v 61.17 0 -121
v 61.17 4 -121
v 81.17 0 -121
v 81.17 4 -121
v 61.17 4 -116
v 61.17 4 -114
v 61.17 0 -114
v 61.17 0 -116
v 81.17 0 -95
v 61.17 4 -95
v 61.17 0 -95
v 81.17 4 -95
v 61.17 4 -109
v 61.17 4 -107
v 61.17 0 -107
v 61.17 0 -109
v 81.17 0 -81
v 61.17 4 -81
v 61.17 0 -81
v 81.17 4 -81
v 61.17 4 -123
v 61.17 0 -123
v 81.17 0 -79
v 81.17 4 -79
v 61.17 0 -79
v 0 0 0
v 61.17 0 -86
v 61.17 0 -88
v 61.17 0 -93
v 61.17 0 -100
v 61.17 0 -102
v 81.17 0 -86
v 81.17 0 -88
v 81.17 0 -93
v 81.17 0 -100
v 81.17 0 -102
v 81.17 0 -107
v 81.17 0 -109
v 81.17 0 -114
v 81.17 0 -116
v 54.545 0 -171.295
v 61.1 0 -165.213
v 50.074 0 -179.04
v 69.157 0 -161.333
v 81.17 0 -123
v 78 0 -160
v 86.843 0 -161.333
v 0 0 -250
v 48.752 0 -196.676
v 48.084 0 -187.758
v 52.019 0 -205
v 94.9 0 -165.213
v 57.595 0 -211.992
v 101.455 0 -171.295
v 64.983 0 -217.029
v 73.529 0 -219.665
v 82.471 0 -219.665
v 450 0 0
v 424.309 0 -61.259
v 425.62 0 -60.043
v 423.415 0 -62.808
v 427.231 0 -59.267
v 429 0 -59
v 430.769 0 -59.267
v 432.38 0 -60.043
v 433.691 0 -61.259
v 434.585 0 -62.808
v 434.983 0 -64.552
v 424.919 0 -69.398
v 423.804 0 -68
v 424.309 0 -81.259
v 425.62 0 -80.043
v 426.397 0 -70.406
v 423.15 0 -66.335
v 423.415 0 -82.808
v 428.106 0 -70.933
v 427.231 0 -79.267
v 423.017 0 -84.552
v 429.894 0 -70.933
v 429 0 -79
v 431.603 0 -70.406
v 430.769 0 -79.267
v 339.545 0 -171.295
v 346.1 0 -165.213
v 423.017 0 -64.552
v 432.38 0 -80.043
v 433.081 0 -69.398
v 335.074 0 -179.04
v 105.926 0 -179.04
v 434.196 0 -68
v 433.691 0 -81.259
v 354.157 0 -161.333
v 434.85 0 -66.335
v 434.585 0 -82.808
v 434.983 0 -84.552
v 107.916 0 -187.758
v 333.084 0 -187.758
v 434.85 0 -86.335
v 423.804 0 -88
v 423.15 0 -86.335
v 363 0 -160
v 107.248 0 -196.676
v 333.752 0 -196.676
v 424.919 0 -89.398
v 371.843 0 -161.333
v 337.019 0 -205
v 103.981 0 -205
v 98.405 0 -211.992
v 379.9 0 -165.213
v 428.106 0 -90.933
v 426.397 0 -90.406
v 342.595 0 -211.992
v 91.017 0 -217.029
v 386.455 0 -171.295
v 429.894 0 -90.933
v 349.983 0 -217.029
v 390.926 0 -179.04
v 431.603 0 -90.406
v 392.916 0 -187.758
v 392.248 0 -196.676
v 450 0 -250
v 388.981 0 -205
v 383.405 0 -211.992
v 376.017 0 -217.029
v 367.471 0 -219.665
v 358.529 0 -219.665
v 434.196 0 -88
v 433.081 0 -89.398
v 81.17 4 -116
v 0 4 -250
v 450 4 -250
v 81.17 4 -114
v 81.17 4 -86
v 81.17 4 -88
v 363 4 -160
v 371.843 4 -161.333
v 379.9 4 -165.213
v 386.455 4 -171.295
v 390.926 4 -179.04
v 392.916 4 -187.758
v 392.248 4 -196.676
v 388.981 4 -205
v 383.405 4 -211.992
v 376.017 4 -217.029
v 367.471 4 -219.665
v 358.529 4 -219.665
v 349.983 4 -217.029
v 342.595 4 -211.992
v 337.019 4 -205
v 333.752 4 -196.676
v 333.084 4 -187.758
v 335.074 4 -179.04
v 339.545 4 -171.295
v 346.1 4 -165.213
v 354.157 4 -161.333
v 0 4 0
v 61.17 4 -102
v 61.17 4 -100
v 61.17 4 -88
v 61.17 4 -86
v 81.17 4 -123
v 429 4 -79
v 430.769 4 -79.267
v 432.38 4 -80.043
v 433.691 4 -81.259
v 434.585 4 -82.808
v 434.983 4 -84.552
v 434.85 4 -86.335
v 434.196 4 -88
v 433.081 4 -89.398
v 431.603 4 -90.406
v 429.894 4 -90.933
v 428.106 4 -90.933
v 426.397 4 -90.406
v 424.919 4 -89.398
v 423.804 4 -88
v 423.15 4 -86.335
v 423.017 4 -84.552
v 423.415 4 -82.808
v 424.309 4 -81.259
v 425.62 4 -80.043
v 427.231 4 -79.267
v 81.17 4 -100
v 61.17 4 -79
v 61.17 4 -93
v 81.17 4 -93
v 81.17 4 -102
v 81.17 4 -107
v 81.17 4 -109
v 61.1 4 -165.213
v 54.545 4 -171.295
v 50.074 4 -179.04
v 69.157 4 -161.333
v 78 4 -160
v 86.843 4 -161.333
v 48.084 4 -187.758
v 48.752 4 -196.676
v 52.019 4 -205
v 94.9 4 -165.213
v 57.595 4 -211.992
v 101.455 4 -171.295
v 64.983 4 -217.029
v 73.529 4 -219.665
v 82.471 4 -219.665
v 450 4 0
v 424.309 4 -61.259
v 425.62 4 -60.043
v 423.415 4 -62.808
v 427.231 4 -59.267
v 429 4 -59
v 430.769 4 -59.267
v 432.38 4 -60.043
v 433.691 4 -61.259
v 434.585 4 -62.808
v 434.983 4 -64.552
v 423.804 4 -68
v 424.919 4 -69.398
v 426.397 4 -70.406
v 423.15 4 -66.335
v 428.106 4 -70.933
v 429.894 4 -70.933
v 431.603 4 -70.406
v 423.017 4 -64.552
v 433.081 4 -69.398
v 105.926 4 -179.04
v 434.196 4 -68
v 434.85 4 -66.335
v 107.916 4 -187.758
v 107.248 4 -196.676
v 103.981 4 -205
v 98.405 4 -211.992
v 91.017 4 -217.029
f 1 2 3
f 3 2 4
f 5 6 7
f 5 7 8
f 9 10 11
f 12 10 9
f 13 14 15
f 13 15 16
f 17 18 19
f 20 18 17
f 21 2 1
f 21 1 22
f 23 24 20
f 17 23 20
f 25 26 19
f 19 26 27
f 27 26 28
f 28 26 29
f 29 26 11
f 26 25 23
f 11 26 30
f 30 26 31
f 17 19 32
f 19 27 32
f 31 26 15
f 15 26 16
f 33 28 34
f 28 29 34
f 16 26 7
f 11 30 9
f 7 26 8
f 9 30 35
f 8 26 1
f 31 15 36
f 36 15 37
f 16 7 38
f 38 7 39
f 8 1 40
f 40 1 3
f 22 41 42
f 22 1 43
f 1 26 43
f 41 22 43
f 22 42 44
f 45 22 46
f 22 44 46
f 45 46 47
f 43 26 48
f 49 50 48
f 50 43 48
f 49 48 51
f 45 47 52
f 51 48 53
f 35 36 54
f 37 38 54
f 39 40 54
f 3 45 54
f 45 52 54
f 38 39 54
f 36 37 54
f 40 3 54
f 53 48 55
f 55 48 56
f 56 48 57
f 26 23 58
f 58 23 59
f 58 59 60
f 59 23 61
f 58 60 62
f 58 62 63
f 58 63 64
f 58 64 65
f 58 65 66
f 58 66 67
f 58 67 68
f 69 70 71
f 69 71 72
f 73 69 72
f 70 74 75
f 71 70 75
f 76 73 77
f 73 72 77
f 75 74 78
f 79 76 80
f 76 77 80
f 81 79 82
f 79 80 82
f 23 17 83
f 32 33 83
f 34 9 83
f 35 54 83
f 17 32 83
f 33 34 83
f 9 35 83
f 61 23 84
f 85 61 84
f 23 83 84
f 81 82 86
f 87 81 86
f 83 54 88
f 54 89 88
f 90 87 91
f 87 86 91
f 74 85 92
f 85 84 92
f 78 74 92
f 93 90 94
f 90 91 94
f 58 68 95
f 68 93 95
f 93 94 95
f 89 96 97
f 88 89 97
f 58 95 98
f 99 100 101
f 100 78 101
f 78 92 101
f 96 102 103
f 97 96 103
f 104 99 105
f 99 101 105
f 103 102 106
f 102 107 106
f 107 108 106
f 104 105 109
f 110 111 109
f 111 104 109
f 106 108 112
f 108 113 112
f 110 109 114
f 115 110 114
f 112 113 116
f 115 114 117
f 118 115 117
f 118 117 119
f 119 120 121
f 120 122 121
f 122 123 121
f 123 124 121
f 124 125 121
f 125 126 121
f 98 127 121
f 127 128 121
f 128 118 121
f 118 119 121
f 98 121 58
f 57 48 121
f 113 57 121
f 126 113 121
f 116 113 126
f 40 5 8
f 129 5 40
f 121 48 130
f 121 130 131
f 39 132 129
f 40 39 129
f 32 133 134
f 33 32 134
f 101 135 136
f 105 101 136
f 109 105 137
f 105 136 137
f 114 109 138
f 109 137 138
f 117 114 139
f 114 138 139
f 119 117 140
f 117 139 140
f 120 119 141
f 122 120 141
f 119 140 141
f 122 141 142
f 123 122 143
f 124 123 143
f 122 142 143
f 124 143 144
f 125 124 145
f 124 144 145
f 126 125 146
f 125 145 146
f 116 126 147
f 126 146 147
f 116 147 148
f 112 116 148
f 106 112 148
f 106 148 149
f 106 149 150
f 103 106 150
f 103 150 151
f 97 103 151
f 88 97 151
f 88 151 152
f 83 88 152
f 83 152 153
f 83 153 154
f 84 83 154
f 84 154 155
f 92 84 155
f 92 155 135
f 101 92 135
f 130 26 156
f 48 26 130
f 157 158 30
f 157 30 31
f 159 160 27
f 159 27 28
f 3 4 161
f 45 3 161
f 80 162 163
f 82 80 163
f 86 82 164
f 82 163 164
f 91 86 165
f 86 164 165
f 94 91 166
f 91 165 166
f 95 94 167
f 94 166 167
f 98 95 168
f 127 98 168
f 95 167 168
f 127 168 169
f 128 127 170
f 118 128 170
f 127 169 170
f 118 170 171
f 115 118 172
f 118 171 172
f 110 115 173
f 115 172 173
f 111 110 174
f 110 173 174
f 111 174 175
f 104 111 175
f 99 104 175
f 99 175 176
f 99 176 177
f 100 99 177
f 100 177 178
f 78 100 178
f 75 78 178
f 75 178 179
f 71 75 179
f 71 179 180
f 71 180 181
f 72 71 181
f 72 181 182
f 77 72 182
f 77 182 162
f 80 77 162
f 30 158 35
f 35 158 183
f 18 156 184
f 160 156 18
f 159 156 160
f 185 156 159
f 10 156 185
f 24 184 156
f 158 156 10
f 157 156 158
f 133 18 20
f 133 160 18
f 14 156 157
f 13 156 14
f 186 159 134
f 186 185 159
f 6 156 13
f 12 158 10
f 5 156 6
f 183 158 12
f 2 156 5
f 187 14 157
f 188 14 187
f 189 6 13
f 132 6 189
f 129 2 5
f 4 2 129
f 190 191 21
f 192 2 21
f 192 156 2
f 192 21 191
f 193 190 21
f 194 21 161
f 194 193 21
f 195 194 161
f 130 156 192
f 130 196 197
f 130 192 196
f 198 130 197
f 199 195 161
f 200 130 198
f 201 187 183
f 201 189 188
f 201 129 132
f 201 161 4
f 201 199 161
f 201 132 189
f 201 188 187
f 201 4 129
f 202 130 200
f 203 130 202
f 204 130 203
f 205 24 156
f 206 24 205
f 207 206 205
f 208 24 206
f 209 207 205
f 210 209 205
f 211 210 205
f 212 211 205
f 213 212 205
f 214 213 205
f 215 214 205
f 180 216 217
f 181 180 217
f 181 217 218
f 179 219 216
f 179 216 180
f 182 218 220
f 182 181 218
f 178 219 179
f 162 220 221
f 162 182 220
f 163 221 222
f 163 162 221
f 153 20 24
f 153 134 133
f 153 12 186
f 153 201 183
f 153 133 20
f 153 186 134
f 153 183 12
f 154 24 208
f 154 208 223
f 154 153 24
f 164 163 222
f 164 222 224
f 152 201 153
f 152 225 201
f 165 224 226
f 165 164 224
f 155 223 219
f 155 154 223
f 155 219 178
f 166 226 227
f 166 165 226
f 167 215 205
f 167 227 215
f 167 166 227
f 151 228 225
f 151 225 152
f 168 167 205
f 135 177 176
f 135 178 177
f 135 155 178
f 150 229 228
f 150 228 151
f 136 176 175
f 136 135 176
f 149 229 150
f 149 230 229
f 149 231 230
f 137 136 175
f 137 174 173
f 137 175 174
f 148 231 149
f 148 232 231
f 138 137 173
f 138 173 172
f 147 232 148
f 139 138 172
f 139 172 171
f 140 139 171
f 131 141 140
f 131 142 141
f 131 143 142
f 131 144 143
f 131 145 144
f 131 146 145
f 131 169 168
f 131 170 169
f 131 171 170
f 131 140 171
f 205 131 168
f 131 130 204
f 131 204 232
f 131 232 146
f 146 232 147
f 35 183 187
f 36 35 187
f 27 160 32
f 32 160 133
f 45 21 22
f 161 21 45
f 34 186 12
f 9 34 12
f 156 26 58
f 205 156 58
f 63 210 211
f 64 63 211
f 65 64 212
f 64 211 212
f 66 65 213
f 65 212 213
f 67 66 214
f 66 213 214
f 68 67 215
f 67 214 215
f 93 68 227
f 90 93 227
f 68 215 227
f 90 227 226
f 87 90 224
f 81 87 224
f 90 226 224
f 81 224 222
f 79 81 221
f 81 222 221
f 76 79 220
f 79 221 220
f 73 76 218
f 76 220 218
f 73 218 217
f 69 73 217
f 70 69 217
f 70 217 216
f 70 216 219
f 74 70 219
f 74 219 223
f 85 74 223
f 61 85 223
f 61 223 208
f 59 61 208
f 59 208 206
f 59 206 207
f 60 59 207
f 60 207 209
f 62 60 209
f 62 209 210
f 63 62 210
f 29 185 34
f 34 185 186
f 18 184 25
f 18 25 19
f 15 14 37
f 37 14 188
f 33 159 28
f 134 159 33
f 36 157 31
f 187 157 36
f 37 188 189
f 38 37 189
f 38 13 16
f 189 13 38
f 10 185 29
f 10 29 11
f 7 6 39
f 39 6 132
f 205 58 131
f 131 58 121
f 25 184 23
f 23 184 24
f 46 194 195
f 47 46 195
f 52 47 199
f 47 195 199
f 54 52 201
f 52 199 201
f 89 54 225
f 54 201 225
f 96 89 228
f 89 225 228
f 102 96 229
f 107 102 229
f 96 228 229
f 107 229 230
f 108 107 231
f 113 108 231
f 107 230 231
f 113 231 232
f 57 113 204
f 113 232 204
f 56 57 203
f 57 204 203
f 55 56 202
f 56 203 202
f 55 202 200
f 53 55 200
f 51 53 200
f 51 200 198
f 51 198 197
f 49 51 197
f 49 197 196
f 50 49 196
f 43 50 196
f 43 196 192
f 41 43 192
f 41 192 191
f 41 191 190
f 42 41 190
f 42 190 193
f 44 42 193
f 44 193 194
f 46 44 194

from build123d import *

# Parameters (mm, degrees)
SKETCH_1_W          = 450
SKETCH_1_H          = 250
EXTRUDE_1_DEPTH     = 4
SKETCH_2_R          = 30
CUT_EXTRUDE_1_DEPTH = 515.797047389
SKETCH_3_R          = 6
SKETCH_3_W          = 20
SKETCH_3_H          = 2
CUT_EXTRUDE_2_DEPTH = 515.797047389


with BuildPart() as part:
    # 草圖1 → 填料-伸長1 (new body)
    with BuildSketch(Plane(origin=(0, 0, 0), x_dir=(1, 0, 0), z_dir=(0, 1, 0))):
        with Locations((225, 125)):
            Rectangle(SKETCH_1_W, SKETCH_1_H)
    extrude(amount=EXTRUDE_1_DEPTH)

    # 草圖2 → 除料-伸長1 (cut, through all)
    with BuildSketch(Plane(origin=(0, 4, 0), x_dir=(1, 0, 0), z_dir=(0, 1, 0))):
        with Locations(Location((78, 190, 0), (0, 0, 270))):
            Circle(SKETCH_2_R)
        with Locations(Location((363, 190, 0), (0, 0, 270))):
            Circle(SKETCH_2_R)
    extrude(amount=-CUT_EXTRUDE_1_DEPTH, mode=Mode.SUBTRACT)

    # 草圖3 → 除料-伸長2 (cut, through all)
    with BuildSketch(Plane(origin=(0, 4, 0), x_dir=(1, 0, 0), z_dir=(0, 1, 0))):
        with Locations(Location((429, 85, 0), (0, 0, 270))):
            Circle(SKETCH_3_R)
        with Locations(Location((429, 65, 0), (0, 0, 270))):
            Circle(SKETCH_3_R)
        with Locations((71.17, 122)):
            Rectangle(SKETCH_3_W, SKETCH_3_H)
        with Locations((71.17, 101)):
            Rectangle(SKETCH_3_W, SKETCH_3_H)
        with Locations((71.17, 115)):
            Rectangle(SKETCH_3_W, SKETCH_3_H)
        with Locations((71.17, 108)):
            Rectangle(SKETCH_3_W, SKETCH_3_H)
        with Locations((71.17, 94)):
            Rectangle(SKETCH_3_W, SKETCH_3_H)
        with Locations((71.17, 87)):
            Rectangle(SKETCH_3_W, SKETCH_3_H)
        with Locations((71.17, 80)):
            Rectangle(SKETCH_3_W, SKETCH_3_H)
    extrude(amount=-CUT_EXTRUDE_2_DEPTH, mode=Mode.SUBTRACT)


solid = part.part
